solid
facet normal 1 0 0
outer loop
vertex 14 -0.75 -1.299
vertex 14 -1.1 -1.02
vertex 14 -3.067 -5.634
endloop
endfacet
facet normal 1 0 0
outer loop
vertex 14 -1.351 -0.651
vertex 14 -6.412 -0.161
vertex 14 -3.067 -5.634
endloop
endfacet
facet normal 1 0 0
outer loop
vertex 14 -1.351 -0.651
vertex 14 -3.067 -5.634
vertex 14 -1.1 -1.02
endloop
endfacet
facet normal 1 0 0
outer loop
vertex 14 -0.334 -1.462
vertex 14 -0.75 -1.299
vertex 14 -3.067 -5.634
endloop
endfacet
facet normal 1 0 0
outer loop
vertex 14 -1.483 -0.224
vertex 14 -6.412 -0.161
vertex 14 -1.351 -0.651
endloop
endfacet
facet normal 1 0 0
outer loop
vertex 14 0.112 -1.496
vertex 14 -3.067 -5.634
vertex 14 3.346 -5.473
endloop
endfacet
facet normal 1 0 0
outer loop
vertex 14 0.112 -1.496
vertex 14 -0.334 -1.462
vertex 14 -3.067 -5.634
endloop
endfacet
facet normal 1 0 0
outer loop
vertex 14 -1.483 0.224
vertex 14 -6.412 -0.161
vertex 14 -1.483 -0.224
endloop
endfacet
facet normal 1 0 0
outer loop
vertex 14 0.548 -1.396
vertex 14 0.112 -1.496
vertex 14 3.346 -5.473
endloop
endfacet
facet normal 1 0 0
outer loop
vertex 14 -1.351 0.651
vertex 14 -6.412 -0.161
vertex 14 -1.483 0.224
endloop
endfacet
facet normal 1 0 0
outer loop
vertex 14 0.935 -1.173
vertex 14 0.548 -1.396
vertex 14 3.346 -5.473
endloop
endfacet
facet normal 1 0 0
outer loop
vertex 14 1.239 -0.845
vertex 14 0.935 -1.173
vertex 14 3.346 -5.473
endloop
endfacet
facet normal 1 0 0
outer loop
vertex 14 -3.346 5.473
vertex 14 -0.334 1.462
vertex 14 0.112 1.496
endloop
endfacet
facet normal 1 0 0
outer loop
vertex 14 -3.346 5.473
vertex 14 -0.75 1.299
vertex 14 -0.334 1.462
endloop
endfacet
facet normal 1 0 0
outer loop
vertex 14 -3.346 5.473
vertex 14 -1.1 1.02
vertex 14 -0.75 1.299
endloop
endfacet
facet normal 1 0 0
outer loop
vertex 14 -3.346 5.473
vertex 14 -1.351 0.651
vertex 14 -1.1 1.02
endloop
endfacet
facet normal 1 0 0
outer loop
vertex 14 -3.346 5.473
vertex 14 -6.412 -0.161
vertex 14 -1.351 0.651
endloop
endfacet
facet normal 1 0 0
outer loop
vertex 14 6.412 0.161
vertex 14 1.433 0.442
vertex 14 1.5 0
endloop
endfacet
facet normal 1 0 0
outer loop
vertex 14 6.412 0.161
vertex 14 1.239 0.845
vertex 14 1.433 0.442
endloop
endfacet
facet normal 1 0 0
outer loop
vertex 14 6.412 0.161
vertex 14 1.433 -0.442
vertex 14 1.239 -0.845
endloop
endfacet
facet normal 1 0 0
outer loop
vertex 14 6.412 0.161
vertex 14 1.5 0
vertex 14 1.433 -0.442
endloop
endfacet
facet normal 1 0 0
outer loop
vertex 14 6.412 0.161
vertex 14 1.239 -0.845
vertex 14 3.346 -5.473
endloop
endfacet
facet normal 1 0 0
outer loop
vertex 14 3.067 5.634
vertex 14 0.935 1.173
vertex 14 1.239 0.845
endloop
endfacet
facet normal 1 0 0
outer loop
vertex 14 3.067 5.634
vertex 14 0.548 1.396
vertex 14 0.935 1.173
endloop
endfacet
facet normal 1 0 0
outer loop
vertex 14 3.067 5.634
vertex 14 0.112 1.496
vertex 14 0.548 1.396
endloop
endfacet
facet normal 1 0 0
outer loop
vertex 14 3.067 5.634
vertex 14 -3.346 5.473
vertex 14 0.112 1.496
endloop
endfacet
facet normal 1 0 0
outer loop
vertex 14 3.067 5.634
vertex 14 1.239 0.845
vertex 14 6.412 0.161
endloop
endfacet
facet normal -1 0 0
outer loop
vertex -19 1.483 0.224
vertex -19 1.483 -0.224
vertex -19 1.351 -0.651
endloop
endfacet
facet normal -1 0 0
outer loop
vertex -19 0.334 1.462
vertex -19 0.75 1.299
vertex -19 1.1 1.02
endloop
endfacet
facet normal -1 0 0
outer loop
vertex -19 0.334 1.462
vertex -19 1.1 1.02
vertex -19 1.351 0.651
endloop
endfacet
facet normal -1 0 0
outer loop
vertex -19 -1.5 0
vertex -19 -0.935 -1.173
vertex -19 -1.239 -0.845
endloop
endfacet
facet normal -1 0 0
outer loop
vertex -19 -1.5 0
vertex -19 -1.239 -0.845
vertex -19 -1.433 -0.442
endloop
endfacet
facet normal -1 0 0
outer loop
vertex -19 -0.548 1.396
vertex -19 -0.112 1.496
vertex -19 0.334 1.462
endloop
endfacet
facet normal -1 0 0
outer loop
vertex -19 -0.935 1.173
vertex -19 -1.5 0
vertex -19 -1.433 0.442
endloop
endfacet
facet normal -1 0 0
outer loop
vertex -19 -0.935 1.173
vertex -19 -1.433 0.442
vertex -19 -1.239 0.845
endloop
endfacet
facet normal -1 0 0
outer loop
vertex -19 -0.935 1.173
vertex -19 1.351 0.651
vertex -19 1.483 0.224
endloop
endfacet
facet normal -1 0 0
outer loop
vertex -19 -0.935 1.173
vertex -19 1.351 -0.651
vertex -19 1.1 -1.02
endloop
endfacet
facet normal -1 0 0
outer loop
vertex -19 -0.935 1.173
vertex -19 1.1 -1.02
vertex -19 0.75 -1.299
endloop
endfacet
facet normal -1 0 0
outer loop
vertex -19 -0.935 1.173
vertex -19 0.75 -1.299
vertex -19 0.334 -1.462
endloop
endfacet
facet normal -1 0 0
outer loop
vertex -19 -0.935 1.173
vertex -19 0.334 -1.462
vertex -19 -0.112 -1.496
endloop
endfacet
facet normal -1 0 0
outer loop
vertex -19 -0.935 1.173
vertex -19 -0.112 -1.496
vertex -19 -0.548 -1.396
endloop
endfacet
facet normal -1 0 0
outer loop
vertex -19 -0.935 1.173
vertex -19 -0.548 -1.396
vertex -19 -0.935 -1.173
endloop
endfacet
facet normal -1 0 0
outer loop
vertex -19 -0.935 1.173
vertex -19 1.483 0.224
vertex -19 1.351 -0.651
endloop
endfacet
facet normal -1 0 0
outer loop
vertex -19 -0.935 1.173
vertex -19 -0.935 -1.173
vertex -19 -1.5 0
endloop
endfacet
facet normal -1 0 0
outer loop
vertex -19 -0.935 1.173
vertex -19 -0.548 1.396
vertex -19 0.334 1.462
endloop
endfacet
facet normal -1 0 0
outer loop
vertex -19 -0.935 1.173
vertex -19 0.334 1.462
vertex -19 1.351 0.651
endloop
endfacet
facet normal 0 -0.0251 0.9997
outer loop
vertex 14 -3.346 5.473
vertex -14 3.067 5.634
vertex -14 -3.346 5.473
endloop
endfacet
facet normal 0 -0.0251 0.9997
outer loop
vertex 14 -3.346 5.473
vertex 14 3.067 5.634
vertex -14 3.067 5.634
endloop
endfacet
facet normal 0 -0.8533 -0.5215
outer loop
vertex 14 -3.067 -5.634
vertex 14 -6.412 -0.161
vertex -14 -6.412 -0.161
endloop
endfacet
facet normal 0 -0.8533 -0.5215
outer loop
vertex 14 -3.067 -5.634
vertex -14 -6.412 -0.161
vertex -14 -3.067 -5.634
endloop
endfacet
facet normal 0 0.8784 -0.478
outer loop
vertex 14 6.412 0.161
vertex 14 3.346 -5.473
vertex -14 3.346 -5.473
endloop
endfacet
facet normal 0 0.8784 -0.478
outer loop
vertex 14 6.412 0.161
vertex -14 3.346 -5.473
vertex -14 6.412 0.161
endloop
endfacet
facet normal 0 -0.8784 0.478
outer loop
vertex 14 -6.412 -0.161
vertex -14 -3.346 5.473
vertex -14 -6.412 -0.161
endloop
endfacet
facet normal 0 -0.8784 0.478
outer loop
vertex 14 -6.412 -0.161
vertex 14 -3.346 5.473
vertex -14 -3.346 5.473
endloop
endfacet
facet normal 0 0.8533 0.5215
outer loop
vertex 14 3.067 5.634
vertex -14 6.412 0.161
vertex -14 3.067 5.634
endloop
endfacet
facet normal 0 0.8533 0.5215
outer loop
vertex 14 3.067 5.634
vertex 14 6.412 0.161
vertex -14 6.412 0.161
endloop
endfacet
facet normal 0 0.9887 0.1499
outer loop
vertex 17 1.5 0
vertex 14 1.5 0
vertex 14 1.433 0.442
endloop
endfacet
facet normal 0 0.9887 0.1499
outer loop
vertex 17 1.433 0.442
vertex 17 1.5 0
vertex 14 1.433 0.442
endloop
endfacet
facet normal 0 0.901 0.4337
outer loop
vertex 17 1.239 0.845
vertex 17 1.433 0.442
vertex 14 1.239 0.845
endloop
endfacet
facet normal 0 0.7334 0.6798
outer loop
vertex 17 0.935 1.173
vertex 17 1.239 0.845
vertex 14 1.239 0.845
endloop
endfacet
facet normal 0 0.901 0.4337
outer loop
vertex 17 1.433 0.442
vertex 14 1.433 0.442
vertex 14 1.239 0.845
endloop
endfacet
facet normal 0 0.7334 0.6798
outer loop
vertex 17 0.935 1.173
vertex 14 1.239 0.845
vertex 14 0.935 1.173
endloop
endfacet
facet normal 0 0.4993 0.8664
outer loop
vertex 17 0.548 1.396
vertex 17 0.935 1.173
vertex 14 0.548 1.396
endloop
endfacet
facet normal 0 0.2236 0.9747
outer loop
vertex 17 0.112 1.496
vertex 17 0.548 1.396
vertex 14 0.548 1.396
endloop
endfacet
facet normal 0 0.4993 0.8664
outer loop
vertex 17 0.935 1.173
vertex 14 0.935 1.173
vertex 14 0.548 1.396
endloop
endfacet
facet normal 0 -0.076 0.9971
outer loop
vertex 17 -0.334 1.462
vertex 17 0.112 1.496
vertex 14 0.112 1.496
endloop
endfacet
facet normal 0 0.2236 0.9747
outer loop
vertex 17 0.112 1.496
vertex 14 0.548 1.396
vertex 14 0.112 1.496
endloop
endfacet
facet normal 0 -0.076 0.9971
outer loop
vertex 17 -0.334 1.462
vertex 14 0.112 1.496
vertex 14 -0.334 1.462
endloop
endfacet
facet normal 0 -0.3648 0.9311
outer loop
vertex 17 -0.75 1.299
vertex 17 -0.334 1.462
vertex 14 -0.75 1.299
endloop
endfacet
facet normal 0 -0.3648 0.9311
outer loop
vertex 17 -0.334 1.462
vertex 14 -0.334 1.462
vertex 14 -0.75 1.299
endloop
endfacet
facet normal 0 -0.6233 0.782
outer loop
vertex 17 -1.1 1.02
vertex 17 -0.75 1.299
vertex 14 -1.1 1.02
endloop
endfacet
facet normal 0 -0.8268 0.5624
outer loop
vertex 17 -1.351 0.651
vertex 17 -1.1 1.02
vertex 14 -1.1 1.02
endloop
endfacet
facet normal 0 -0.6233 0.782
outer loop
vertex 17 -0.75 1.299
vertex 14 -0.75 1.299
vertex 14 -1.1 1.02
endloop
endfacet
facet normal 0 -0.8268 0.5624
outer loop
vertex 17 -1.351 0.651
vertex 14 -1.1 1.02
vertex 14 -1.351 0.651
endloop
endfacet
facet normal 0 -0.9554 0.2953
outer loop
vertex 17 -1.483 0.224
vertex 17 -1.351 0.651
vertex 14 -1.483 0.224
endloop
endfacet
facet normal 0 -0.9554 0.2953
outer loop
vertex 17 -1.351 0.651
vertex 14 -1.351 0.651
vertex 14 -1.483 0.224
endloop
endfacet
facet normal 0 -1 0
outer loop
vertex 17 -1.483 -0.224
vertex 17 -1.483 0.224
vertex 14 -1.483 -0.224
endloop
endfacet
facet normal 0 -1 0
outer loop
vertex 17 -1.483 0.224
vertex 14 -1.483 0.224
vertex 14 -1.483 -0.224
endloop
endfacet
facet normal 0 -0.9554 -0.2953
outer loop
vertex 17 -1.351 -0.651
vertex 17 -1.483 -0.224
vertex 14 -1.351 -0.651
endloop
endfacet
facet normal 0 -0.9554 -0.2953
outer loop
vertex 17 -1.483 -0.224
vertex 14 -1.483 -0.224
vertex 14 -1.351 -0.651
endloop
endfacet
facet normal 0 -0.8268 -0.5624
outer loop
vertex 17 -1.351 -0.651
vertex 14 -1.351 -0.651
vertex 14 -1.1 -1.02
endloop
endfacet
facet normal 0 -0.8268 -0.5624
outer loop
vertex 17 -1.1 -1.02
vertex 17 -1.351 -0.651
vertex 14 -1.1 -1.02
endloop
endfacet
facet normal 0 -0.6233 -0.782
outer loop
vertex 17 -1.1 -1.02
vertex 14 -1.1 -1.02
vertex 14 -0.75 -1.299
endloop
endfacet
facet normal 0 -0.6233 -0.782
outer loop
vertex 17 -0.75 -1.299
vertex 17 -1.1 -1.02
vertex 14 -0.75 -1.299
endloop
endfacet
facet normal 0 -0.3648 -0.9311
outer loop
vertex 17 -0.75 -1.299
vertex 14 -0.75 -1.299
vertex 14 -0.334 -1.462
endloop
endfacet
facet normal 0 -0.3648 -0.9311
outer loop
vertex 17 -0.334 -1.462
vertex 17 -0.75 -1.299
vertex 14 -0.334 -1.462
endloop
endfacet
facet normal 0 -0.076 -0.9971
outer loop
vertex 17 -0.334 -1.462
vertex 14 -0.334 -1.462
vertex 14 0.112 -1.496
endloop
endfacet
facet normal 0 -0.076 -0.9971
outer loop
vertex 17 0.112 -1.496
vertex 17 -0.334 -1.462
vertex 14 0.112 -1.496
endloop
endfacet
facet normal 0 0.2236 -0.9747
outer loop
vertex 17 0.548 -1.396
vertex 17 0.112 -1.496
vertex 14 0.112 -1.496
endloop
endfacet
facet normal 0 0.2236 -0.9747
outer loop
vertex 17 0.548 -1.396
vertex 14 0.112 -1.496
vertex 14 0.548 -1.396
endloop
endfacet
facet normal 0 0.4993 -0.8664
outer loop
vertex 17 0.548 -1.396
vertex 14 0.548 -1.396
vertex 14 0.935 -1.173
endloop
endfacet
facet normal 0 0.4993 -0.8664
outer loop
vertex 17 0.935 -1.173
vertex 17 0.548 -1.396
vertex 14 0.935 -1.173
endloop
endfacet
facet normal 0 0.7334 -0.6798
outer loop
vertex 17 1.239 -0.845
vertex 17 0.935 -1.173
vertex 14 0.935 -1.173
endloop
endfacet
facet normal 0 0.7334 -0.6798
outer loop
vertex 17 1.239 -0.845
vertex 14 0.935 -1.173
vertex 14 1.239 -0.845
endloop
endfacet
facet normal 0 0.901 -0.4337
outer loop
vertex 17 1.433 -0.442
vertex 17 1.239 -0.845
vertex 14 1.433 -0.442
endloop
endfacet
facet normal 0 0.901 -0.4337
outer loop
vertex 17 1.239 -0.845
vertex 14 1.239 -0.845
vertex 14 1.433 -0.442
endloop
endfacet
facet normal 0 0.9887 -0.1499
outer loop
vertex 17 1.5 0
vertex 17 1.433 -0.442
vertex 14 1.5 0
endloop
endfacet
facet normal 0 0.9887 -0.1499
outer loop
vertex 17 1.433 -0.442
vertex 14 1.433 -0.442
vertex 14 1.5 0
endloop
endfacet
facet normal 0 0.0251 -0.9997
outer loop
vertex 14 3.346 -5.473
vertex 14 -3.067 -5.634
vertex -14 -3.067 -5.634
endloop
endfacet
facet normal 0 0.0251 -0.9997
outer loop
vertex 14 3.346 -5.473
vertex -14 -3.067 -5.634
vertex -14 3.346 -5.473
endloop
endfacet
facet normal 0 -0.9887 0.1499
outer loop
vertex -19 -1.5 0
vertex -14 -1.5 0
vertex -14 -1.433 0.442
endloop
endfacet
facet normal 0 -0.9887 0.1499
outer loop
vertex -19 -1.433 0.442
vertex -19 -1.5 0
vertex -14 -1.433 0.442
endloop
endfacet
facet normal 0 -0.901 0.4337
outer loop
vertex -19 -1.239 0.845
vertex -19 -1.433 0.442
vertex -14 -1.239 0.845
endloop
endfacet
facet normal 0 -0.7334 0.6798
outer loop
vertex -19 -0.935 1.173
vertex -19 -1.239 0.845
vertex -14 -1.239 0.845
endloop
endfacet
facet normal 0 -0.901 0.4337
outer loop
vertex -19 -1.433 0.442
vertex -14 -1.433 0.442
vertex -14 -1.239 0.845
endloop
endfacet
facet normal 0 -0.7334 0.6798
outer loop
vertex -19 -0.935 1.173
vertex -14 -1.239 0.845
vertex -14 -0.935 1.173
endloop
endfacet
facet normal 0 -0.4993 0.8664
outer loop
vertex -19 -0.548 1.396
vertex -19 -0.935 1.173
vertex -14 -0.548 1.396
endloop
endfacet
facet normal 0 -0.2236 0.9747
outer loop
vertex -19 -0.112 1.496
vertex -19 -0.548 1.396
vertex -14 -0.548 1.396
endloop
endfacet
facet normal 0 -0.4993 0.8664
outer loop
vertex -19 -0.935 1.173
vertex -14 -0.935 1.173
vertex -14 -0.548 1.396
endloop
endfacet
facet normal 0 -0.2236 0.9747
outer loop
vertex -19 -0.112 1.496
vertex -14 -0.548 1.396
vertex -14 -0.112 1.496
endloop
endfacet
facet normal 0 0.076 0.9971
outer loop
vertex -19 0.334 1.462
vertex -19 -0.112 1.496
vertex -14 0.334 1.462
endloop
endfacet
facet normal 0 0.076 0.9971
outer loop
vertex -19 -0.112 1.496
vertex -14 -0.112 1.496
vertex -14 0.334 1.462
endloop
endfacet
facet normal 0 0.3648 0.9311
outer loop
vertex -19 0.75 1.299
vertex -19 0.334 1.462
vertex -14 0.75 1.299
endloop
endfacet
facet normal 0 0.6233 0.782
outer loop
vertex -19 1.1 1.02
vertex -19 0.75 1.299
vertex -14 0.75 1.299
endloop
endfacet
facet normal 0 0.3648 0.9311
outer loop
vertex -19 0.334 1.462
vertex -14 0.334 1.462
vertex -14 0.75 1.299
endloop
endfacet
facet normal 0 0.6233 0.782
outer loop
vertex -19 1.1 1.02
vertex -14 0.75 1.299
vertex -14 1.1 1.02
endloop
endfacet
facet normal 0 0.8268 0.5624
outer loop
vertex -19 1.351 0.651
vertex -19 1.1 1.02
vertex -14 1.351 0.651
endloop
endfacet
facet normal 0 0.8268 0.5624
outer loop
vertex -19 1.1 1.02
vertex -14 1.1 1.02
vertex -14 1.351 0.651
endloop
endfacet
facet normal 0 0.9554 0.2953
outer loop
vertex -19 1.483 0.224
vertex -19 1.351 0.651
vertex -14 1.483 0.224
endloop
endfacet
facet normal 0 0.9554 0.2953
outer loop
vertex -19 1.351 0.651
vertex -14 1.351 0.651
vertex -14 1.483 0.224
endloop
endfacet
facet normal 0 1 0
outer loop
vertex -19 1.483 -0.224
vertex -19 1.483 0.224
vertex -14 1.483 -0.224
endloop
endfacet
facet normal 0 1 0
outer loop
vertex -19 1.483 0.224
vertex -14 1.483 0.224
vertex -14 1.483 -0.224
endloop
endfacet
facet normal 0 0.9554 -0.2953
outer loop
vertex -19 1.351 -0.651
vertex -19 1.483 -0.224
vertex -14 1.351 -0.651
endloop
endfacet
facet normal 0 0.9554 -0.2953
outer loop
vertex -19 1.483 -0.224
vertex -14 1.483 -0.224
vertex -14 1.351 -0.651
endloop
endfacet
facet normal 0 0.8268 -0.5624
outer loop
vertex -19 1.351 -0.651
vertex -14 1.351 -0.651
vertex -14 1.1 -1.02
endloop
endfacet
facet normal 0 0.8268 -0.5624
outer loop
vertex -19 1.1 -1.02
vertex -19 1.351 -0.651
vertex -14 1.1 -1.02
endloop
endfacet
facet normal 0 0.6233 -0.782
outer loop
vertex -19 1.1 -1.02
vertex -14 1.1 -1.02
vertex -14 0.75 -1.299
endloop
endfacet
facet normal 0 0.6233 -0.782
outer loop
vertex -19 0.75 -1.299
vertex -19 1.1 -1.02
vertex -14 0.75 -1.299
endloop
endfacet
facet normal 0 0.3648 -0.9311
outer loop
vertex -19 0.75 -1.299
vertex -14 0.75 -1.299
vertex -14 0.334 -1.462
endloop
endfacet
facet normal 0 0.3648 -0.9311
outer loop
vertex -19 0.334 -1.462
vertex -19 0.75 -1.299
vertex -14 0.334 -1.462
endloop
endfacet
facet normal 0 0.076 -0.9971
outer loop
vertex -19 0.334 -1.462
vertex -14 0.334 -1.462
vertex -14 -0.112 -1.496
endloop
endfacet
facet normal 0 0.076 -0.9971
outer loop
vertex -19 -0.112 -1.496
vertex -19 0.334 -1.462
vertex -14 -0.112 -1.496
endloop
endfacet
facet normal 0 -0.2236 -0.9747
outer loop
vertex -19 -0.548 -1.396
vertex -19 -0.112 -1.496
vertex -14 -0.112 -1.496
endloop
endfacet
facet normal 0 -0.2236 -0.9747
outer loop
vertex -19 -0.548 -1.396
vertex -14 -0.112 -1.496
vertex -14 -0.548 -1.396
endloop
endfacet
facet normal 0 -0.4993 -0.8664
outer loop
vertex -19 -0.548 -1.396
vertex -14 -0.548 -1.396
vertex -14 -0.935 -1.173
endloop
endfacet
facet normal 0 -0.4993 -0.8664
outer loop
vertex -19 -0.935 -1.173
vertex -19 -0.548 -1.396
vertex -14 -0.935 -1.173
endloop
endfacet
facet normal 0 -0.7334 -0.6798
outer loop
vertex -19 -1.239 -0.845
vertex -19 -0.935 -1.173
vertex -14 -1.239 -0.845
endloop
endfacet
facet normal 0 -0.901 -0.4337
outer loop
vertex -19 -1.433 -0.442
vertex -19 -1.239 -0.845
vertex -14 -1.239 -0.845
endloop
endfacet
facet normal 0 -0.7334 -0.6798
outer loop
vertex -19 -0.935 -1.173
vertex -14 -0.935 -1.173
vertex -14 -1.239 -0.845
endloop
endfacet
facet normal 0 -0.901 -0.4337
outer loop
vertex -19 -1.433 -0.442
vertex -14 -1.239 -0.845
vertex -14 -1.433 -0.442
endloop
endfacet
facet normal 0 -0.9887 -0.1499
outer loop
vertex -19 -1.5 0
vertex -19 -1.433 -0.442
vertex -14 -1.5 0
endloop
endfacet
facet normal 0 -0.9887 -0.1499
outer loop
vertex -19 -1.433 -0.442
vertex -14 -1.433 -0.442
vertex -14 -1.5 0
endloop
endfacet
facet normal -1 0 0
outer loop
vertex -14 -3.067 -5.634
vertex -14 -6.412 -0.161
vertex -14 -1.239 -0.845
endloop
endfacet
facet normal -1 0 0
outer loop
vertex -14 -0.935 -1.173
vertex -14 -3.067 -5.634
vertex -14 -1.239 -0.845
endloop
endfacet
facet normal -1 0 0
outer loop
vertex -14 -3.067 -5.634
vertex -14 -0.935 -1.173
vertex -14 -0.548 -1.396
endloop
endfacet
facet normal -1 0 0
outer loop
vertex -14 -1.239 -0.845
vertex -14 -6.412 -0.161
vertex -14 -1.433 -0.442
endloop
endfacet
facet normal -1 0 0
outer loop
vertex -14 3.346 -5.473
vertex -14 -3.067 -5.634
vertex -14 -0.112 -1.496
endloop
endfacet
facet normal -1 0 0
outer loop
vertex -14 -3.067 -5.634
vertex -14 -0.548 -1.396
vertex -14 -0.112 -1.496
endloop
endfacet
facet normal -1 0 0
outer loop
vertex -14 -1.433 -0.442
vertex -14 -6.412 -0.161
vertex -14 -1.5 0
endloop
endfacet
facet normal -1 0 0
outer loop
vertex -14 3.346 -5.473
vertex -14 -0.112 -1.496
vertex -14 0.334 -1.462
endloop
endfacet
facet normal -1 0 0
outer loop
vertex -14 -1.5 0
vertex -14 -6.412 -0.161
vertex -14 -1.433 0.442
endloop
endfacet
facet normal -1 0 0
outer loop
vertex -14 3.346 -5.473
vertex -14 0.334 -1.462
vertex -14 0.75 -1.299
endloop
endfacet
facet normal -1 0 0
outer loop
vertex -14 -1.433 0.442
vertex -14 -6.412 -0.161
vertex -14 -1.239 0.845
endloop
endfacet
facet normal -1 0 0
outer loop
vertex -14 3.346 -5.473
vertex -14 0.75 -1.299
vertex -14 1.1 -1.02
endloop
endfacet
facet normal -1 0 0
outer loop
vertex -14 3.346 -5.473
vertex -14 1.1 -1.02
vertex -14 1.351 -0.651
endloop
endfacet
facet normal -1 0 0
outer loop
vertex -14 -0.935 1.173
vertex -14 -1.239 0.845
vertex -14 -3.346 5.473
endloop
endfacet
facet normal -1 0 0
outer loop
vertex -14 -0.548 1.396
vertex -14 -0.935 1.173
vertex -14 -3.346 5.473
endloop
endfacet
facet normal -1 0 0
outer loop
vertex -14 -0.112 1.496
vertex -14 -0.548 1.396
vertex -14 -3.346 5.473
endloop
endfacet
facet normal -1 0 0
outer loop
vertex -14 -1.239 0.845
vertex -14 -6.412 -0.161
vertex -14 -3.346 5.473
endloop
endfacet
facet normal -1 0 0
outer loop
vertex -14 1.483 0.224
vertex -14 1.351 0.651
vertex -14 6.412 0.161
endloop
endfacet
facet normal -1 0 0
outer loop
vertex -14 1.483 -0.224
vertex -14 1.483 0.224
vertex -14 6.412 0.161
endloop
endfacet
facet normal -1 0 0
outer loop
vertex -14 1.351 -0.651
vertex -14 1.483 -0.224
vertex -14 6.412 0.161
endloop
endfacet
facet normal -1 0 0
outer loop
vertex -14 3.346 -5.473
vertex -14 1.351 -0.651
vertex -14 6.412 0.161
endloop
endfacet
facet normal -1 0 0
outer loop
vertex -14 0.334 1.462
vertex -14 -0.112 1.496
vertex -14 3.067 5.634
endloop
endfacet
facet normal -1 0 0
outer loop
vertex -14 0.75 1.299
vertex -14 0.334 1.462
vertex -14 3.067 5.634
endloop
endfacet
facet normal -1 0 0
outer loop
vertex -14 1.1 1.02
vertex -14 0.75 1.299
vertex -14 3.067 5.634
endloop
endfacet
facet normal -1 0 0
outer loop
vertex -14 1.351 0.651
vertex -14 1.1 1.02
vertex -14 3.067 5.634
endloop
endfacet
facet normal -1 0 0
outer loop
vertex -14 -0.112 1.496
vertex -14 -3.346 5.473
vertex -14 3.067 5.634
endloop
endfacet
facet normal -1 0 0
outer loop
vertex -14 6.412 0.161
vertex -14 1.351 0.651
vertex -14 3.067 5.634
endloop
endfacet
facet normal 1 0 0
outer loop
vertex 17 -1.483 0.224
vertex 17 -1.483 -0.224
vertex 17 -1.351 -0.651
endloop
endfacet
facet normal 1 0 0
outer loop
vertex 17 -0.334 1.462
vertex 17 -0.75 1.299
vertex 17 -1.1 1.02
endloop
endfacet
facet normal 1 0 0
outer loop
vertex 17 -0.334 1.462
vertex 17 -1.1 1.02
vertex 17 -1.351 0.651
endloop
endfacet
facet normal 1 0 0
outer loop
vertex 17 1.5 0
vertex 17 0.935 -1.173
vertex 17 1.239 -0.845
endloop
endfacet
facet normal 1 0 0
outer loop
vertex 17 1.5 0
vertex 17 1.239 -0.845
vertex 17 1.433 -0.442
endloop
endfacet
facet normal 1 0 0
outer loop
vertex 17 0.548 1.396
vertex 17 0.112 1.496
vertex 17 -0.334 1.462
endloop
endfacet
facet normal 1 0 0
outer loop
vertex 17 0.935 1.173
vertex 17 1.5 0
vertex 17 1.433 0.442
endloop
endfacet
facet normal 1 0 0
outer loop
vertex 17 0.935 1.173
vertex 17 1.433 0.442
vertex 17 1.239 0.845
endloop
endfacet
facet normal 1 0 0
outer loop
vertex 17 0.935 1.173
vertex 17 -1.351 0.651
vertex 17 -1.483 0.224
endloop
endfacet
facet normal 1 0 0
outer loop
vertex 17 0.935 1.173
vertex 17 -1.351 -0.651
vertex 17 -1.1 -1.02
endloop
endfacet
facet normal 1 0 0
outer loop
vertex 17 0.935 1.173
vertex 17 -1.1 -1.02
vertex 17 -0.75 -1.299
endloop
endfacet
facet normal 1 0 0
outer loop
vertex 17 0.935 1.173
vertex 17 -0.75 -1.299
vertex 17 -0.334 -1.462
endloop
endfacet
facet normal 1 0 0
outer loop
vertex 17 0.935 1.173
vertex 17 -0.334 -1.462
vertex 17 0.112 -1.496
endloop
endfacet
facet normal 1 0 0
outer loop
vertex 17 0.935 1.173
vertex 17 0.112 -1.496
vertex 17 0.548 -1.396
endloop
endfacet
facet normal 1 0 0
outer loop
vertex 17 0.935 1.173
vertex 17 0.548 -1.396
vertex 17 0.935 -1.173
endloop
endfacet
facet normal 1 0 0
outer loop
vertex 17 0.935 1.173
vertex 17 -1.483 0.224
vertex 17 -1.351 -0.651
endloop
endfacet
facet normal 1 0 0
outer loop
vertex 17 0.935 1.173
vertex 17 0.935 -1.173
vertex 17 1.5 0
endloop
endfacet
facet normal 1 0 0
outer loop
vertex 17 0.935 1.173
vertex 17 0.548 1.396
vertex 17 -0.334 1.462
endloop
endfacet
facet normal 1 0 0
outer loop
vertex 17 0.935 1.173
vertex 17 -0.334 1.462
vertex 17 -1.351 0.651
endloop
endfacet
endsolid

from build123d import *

# Parameters (mm, degrees)
F1_DEPTH = 14
F2_R     = 1.5
F3_DEPTH = 3
F4_R     = 1.5
F5_DEPTH = 5


with BuildPart() as f1:
    # F0 (on Right) → F1 (new body, symmetric)
    with BuildSketch(Plane.YZ):
        Polygon((-3.3458015204, 5.4726269304), (-6.4123347074, -0.1612356475), (-3.0665331869, -5.6338625779), (3.3458015204, -5.4726269304), (6.4123347074, 0.1612356475), (3.0665331869, 5.6338625779), align=None)
    extrude(amount=F1_DEPTH, both=True)

    # F2 (on face) → F3 (join)
    with BuildSketch(Plane.YZ.offset(14)):
        Circle(F2_R)
    extrude(amount=F3_DEPTH)

    # F4 (on face) → F5 (join)
    with BuildSketch(Plane(origin=(-14, 0, 0), x_dir=(0, -1, 0), z_dir=(-1, 0, 0))):
        Circle(F4_R)
    extrude(amount=F5_DEPTH)


solid = f1.part
